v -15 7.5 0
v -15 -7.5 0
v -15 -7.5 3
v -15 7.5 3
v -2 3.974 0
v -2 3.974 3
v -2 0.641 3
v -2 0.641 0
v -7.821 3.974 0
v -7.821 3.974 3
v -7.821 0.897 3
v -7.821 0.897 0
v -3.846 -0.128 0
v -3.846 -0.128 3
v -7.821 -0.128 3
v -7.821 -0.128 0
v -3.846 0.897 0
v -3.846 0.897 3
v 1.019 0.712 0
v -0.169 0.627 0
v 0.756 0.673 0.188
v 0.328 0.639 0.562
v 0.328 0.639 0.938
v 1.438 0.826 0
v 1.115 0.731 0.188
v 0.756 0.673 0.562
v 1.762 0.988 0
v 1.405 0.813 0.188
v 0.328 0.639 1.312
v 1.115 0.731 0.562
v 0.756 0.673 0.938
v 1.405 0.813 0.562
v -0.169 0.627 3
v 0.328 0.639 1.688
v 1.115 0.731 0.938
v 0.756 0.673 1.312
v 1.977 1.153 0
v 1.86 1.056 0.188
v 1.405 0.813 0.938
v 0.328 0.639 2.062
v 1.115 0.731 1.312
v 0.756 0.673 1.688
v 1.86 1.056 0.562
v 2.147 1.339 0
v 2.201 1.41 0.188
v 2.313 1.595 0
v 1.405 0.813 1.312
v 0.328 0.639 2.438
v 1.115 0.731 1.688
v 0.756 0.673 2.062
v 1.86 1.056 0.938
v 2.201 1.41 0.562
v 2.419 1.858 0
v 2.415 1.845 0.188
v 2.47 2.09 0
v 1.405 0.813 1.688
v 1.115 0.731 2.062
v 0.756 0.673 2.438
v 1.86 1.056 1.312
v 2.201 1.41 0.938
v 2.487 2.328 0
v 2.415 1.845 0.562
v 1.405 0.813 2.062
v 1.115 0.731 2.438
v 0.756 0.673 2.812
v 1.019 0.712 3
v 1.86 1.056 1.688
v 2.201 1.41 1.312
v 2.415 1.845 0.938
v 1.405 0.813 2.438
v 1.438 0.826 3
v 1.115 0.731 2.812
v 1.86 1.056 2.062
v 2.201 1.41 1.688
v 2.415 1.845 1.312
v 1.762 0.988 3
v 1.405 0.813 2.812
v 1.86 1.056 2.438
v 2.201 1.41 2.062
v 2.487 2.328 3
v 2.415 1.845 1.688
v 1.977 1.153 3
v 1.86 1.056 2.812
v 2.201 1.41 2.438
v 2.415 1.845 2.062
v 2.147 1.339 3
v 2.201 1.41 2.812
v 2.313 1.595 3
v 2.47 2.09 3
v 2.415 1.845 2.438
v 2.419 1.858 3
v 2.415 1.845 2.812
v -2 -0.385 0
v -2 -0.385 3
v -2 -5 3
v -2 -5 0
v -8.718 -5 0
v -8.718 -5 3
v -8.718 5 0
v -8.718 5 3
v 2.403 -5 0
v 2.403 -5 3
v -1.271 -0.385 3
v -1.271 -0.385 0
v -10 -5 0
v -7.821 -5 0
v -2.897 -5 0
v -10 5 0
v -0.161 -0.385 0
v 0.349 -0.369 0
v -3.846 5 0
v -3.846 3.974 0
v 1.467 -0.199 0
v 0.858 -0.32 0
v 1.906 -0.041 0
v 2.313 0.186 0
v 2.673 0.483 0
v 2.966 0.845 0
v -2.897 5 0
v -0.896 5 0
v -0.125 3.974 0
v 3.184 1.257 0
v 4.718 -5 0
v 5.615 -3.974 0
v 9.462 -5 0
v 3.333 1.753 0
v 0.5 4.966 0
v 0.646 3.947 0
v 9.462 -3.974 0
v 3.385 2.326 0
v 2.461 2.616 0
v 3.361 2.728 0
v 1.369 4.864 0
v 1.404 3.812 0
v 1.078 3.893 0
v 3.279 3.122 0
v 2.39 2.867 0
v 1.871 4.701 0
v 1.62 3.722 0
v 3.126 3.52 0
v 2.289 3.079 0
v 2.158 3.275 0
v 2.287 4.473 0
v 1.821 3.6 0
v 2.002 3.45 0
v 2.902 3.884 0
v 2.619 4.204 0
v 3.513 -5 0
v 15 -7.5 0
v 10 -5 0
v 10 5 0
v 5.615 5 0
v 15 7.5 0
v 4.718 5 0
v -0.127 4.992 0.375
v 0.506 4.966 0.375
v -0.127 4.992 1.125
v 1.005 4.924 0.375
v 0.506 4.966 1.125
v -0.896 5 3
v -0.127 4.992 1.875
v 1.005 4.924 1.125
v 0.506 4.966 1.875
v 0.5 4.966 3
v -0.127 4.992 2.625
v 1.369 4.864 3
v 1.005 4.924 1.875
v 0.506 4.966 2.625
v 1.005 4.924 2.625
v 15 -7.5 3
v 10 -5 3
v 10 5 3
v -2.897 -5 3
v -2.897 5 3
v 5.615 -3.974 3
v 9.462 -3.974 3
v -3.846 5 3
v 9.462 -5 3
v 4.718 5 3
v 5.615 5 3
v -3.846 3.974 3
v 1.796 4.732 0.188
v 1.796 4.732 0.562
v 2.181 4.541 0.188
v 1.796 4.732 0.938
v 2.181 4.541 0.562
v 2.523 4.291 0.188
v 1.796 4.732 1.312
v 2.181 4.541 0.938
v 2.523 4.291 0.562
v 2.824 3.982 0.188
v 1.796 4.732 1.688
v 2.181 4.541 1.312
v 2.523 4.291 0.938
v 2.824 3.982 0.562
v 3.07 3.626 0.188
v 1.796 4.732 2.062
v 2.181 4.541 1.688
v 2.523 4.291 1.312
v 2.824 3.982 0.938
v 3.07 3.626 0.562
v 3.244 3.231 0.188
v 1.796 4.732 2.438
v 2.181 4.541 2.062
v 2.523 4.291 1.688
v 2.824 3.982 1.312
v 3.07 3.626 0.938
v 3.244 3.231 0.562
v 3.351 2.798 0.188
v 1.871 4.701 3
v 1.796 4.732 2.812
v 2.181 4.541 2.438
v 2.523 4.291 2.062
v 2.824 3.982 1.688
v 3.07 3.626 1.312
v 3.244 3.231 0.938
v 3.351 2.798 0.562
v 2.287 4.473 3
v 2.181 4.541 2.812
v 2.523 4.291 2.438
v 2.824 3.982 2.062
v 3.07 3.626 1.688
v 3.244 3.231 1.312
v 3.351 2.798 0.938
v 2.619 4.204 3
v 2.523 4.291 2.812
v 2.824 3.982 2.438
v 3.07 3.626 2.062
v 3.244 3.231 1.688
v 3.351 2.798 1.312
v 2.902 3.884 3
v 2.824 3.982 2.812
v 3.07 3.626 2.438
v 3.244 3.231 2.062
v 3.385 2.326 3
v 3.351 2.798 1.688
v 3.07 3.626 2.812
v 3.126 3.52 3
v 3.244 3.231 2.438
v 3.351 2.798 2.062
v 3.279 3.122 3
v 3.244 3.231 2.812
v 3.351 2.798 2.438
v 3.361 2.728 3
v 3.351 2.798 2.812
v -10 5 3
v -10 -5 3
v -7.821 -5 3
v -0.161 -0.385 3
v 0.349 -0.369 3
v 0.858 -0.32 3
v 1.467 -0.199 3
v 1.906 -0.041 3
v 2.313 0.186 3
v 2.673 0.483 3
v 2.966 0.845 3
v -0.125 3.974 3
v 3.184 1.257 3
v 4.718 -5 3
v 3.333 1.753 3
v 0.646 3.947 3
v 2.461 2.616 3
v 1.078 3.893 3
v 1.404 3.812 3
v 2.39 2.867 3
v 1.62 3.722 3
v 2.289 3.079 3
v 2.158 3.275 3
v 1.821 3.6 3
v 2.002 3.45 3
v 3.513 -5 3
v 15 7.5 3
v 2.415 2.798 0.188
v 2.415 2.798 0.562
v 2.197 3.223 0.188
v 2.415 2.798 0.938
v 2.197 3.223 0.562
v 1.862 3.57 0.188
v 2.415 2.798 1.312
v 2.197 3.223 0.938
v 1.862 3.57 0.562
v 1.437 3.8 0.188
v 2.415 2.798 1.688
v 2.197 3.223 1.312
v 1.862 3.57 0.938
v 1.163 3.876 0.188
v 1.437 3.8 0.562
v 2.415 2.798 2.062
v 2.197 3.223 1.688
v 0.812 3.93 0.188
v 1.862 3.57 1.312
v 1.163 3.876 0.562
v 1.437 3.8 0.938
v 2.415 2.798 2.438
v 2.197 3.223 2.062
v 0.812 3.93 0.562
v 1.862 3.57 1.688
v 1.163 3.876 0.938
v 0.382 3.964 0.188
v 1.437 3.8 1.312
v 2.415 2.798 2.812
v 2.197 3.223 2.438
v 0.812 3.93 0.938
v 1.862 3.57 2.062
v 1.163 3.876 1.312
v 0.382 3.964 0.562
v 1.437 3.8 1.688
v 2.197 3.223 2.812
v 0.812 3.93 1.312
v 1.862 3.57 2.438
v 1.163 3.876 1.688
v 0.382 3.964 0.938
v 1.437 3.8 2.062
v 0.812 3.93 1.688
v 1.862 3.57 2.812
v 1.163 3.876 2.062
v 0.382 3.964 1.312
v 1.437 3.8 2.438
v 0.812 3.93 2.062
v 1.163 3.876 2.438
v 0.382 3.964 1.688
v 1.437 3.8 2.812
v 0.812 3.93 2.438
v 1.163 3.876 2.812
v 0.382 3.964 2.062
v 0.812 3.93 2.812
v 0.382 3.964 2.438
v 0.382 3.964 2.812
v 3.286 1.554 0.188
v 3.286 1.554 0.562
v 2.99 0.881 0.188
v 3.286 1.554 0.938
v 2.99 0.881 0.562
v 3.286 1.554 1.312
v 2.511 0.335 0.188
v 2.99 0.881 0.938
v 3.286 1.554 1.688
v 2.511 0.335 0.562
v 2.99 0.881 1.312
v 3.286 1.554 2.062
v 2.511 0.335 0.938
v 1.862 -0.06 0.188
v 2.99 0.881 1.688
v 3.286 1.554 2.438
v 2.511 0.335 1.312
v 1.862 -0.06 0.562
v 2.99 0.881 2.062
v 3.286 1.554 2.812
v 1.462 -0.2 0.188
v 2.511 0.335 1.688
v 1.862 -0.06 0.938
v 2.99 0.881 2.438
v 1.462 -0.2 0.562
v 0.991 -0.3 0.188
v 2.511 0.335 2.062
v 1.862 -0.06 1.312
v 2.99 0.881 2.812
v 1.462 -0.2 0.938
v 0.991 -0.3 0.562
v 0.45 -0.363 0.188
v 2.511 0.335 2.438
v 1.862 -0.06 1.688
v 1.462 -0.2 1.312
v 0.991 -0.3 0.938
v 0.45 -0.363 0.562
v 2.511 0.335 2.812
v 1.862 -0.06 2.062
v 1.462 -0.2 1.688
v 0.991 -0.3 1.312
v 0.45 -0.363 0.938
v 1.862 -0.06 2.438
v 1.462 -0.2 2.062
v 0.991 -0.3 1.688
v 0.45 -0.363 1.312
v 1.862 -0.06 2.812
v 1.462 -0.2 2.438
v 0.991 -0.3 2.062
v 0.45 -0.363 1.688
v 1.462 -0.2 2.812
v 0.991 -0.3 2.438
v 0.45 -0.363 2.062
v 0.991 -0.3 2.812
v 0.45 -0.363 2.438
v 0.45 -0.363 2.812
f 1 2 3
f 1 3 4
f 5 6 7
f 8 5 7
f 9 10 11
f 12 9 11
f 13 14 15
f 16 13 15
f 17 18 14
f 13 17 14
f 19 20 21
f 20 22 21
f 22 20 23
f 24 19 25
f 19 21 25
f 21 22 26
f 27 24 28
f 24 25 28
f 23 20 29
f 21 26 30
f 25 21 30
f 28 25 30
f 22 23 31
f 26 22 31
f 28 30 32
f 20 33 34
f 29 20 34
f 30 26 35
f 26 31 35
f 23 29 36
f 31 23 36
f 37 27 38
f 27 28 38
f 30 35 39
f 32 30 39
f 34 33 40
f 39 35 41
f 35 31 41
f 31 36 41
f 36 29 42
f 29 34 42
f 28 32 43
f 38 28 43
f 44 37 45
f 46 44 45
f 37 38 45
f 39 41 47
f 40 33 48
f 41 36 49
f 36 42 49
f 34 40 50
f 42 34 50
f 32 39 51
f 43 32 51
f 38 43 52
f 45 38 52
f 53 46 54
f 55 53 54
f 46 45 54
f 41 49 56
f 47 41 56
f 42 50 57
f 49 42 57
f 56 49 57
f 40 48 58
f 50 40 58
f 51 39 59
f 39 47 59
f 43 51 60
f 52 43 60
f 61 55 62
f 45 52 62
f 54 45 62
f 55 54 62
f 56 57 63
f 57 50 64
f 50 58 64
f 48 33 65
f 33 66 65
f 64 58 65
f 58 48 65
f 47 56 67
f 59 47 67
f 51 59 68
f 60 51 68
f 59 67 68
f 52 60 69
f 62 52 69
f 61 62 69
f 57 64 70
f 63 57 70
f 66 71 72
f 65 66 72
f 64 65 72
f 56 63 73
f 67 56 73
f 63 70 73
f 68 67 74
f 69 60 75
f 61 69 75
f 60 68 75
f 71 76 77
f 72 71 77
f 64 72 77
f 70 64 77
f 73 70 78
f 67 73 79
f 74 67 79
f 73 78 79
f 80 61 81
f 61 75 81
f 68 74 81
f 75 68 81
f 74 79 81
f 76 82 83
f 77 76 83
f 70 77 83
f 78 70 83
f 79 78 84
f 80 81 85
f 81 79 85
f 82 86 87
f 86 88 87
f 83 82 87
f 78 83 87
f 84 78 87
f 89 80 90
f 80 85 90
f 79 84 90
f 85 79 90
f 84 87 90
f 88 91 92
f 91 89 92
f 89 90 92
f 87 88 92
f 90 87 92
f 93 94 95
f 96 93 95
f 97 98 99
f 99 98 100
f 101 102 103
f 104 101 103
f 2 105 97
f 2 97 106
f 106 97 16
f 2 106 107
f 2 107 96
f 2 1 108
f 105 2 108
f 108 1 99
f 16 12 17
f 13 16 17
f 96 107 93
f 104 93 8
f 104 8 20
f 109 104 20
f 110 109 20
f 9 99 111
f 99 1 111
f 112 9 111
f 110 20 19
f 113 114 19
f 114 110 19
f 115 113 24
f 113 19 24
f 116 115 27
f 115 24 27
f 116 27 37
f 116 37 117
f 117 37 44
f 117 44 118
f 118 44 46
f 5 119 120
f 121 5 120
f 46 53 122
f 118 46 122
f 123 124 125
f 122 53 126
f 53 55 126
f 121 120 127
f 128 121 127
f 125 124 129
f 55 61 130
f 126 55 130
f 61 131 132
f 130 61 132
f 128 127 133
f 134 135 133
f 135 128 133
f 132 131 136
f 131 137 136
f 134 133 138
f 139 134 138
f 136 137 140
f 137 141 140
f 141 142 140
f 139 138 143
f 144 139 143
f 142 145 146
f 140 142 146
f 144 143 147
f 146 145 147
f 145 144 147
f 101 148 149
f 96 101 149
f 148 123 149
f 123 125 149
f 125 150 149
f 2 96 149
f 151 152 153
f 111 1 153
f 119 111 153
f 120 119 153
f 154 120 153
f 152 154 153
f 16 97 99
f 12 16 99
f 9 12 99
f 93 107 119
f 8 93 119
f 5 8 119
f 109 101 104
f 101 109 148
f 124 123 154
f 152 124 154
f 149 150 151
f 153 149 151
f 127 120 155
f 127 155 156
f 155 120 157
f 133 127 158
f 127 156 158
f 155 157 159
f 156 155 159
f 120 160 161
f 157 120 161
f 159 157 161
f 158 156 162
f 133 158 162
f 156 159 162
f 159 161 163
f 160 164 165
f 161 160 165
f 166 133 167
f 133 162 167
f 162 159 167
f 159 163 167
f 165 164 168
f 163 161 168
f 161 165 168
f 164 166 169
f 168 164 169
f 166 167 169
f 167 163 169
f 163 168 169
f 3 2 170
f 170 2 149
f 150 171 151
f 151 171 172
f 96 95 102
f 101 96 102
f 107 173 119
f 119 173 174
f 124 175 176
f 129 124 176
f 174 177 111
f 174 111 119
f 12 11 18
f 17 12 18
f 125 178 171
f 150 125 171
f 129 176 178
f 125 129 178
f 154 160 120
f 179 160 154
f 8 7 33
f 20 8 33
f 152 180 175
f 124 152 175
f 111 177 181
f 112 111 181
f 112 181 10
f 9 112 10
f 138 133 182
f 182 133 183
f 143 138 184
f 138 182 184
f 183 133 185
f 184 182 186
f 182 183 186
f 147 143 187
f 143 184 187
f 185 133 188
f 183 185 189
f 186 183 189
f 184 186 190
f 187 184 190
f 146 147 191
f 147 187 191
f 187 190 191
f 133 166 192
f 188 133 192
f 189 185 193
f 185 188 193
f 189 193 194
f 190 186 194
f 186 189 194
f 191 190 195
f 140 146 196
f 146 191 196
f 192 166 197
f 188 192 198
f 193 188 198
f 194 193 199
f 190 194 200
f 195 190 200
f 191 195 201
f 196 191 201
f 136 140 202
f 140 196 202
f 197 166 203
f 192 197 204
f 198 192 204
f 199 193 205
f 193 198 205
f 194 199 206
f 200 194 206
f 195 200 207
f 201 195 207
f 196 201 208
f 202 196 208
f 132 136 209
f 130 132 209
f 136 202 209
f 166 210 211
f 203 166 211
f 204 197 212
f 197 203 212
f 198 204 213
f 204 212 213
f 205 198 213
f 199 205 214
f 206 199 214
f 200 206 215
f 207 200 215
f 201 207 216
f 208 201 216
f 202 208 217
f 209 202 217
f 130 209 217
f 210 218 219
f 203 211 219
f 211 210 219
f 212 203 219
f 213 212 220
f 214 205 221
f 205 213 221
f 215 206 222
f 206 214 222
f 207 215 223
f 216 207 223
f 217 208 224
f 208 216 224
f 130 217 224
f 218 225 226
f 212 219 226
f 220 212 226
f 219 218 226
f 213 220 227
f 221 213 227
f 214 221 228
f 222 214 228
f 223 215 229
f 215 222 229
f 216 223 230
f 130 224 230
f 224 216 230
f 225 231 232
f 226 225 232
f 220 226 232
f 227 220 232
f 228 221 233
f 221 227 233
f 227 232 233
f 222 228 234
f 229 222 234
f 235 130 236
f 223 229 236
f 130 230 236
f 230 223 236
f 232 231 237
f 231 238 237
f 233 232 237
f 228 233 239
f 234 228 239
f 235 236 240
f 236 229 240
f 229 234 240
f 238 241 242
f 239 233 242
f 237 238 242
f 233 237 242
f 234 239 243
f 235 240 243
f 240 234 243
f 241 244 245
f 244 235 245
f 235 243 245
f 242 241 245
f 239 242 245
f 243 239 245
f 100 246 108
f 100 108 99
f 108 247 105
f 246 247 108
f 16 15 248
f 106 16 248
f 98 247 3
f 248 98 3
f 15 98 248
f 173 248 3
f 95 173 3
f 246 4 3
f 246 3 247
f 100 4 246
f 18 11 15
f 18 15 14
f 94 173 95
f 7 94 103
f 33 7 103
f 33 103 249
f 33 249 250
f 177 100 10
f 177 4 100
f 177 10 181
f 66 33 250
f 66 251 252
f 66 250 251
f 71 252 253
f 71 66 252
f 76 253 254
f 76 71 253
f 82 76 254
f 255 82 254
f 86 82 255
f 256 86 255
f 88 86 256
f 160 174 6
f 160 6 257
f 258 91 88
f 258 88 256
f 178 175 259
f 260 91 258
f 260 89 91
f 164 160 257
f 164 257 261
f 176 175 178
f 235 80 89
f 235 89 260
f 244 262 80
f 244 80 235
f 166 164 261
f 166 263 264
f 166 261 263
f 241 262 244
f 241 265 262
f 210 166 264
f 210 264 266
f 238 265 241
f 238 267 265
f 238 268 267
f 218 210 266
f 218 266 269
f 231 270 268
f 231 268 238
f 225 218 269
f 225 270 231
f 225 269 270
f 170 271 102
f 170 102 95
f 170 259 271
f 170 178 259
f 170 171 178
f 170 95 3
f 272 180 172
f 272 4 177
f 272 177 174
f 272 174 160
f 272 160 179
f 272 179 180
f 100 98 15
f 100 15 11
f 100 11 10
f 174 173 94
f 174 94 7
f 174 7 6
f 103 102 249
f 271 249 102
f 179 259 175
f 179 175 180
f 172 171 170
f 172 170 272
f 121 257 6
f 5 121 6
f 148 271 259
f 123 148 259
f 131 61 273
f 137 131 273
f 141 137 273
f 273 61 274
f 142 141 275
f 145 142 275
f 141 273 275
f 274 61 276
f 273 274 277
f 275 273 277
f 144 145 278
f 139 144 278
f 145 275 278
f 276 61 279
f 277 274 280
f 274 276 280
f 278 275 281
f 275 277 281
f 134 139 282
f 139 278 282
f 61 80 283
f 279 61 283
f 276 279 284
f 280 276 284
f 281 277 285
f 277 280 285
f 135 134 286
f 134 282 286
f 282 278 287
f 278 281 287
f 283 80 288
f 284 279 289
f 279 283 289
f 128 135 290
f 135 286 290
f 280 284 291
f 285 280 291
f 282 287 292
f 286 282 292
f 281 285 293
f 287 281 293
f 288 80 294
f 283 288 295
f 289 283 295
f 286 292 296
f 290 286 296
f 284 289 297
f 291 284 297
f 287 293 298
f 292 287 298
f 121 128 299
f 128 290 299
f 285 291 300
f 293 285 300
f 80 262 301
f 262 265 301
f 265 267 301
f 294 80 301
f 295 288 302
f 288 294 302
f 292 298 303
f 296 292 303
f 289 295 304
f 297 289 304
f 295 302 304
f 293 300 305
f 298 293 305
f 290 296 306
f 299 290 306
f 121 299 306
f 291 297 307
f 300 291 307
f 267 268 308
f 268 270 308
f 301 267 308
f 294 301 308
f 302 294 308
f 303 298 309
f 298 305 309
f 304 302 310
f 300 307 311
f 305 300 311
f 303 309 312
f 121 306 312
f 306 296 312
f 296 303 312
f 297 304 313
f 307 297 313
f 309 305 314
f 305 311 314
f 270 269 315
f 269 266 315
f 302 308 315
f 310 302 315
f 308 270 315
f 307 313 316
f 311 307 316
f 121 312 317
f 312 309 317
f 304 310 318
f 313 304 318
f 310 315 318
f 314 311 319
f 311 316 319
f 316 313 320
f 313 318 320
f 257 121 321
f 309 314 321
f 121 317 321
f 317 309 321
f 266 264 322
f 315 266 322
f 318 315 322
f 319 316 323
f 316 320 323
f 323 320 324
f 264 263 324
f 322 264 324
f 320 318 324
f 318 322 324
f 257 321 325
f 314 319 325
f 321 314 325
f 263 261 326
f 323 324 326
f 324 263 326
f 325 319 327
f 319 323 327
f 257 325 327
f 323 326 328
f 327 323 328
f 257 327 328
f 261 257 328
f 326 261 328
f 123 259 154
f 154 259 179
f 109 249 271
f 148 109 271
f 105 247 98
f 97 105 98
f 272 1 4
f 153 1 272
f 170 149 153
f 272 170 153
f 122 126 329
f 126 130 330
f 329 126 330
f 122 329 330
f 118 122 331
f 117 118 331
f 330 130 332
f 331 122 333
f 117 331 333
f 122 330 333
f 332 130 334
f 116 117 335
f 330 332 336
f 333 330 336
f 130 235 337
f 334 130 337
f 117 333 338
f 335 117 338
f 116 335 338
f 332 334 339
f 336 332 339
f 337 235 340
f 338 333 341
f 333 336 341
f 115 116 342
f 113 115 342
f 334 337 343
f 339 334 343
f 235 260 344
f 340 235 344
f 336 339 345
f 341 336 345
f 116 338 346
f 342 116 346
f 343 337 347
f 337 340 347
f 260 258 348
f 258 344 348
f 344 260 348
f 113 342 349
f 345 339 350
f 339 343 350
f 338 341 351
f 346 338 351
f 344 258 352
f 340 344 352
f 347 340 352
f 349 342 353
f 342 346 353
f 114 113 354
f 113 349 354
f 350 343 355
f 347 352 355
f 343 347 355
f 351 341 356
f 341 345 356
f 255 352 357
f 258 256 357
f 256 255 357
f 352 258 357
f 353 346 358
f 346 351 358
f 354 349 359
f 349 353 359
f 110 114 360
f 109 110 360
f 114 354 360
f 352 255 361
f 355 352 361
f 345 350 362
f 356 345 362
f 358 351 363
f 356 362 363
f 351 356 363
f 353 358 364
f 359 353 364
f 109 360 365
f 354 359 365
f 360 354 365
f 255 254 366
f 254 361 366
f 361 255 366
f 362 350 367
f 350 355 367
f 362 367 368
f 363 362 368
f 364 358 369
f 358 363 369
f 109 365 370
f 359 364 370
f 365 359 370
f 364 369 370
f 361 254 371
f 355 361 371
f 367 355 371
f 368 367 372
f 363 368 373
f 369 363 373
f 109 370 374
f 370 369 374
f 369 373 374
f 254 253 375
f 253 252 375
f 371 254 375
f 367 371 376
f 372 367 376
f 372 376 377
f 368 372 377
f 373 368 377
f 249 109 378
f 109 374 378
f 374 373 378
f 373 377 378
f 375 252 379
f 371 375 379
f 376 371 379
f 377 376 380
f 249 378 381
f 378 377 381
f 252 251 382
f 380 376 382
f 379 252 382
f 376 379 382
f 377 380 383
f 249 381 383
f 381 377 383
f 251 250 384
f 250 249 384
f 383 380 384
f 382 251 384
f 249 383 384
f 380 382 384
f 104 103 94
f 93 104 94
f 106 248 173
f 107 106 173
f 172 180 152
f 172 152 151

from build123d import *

# Parameters (mm, degrees)
SKETCH1_W           = 30
SKETCH1_H           = 15
BOSS_EXTRUDE1_DEPTH = 3
SKETCH2_W           = 20
SKETCH2_H           = 10
CUT_EXTRUDE1_DEPTH  = 18.036725037
BOSS_EXTRUDE2_DEPTH = 3


with BuildPart() as part:
    # Sketch1 → Boss-Extrude1 (new body)
    with BuildSketch(Plane.XY):
        Rectangle(SKETCH1_W, SKETCH1_H)
    extrude(amount=BOSS_EXTRUDE1_DEPTH)

    # Sketch2 → Cut-Extrude1 (cut, through all)
    with BuildSketch(Plane.XY.offset(3)):
        Rectangle(SKETCH2_W, SKETCH2_H)
    extrude(amount=-CUT_EXTRUDE1_DEPTH, mode=Mode.SUBTRACT)

    # Sketch3 → Boss-Extrude2 (add)
    # profile 1 of 3: a face of its own
    with BuildSketch(Plane.XY.offset(3)):
        Polygon((-8.717948718, 5), (-3.846153846, 5), (-3.846153846, 3.974358974), (-7.820512821, 3.974358974), (-7.820512821, 0.897435897), (-3.846153846, 0.897435897), (-3.846153846, -0.128205128), (-7.820512821, -0.128205128), (-7.820512821, -5), (-8.717948718, -5), align=None)
    # profile 2 of 3: a face of its own
    with BuildSketch(Plane.XY.offset(3)):
        with BuildLine():
            Line((-2.897435897, 5), (-0.896233974, 5))
            add(Edge.make_bspline(
                [(-0.896233974, 5), (-0.762687893, 4.999555469), (-0.506264623, 4.998701919), (-0.138912422, 4.993942596), (0.194879284, 4.98030158), (0.494935967, 4.96856277), (0.761252124, 4.947157224), (0.994644384, 4.926698232), (1.194037805, 4.899916344), (1.314740237, 4.875043707), (1.369391026, 4.863782051)],
                knots=[0, 0, 0, 0, 1.410062039, 2.707475311, 3.878576406, 4.937260626, 5.877586885, 6.699081471, 7.410979367, 8, 8, 8, 8], degree=3))
            add(Edge.make_bspline(
                [(1.369391026, 4.863782051), (1.442552809, 4.845705579), (1.587315636, 4.809938254), (1.795744396, 4.734339395), (1.99435675, 4.646854753), (2.182327677, 4.544101266), (2.358715652, 4.425316181), (2.525339397, 4.292550117), (2.682955006, 4.146529529), (2.825188236, 3.983572839), (2.959299812, 3.812611383), (3.072410173, 3.627743506), (3.169914401, 3.434424856), (3.24754445, 3.230689377), (3.310052945, 3.018512886), (3.354127915, 2.795973467), (3.38055988, 2.564084967), (3.383250895, 2.405919513), (3.384615385, 2.325721154)],
                knots=[0, 0, 0, 0, 1.027469482, 2.033020251, 3.019912614, 3.986113645, 4.951240523, 5.91722682, 6.890402269, 7.87763091, 8.8651537, 9.85103654, 10.82876324, 11.815024772, 12.821070561, 13.842952187, 14.906261191, 16, 16, 16, 16], degree=3))
            add(Edge.make_bspline(
                [(3.384615385, 2.325721154), (3.380418247, 2.192477998), (3.372228545, 1.93248609), (3.295871106, 1.555169286), (3.170795335, 1.203199815), (2.998443081, 0.87702085), (2.778958865, 0.582990434), (2.515173747, 0.324731991), (2.206940571, 0.108617955), (1.919999669, -0.041247202), (1.666530527, -0.137226941), (1.457863919, -0.204759394), (1.230243983, -0.256936438), (0.985851598, -0.303679672), (0.723669726, -0.338970227), (0.444326756, -0.36481764), (0.147623466, -0.380972065), (-0.056202447, -0.383377793), (-0.161057692, -0.384615385)],
                knots=[0, 0, 0, 0, 1.260483769, 2.459530307, 3.627416485, 4.787058657, 5.939039949, 7.08810263, 8.267026773, 9.491475466, 10.141966685, 10.831826277, 11.566392101, 12.351337768, 13.187381173, 14.07005841, 15.007169909, 16, 16, 16, 16], degree=3))
            Line((-0.161057692, -0.384615385), (3.512820513, -5))
            Line((3.512820513, -5), (2.403044872, -5))
            Line((2.403044872, -5), (-1.270833333, -0.384615385))
            Line((-1.270833333, -0.384615385), (-2, -0.384615385))
            Line((-2, -0.384615385), (-2, -5))
            Line((-2, -5), (-2.897435897, -5))
            Line((-2.897435897, -5), (-2.897435897, 5))
        make_face()
        with BuildLine():
            Line((-2, 3.974358974), (-2, 0.641025641))
            Line((-2, 0.641025641), (-0.169070513, 0.627003205))
            add(Edge.make_bspline(
                [(-0.169070513, 0.627003205), (-0.083584687, 0.626965386), (0.08211119, 0.626892082), (0.321827375, 0.638302871), (0.545027694, 0.651283781), (0.750858415, 0.671139054), (0.939411487, 0.69672783), (1.110592668, 0.728736356), (1.264681388, 0.766027964), (1.444391497, 0.823746895), (1.645067301, 0.915192661), (1.863157187, 1.048236943), (2.048878152, 1.215577284), (2.20578633, 1.406930015), (2.33187042, 1.617319298), (2.420762003, 1.84422321), (2.477168981, 2.08191349), (2.483821968, 2.245279512), (2.487179487, 2.327724359)],
                knots=[0, 0, 0, 0, 1.146690395, 2.22261258, 3.21895312, 4.145990853, 4.996080663, 5.770904154, 6.481378293, 7.121626537, 8.300444488, 9.431385265, 10.535395872, 11.636531494, 12.74115979, 13.810798291, 14.895190096, 16, 16, 16, 16], degree=3))
            add(Edge.make_bspline(
                [(2.487179487, 2.327724359), (2.483744855, 2.408143141), (2.476938669, 2.567503823), (2.421370759, 2.800806424), (2.327401098, 3.02099771), (2.200766132, 3.227181953), (2.046482832, 3.414341198), (1.865574796, 3.574475921), (1.662988524, 3.706617249), (1.473642243, 3.791058336), (1.304401636, 3.842829345), (1.15745975, 3.879261242), (0.991426957, 3.908531153), (0.805497075, 3.931982755), (0.600463844, 3.952139739), (0.375290555, 3.96571625), (0.131471183, 3.973755861), (-0.037520049, 3.974153258), (-0.125, 3.974358974)],
                knots=[0, 0, 0, 0, 1.101028733, 2.181837193, 3.264309656, 4.369019818, 5.486613113, 6.575447106, 7.666700264, 8.788928104, 9.402425223, 10.0903467, 10.862060571, 11.710948788, 12.657782767, 13.684531032, 14.801375019, 16, 16, 16, 16], degree=3))
            Line((-0.125, 3.974358974), (-2, 3.974358974))
        make_face(mode=Mode.SUBTRACT)
    # profile 3 of 3: a face of its own
    with BuildSketch(Plane.XY.offset(3)):
        Polygon((4.717948718, 5), (5.615384615, 5), (5.615384615, -3.974358974), (9.461538462, -3.974358974), (9.461538462, -5), (4.717948718, -5), align=None)
    extrude(amount=-BOSS_EXTRUDE2_DEPTH)


solid = part.part
